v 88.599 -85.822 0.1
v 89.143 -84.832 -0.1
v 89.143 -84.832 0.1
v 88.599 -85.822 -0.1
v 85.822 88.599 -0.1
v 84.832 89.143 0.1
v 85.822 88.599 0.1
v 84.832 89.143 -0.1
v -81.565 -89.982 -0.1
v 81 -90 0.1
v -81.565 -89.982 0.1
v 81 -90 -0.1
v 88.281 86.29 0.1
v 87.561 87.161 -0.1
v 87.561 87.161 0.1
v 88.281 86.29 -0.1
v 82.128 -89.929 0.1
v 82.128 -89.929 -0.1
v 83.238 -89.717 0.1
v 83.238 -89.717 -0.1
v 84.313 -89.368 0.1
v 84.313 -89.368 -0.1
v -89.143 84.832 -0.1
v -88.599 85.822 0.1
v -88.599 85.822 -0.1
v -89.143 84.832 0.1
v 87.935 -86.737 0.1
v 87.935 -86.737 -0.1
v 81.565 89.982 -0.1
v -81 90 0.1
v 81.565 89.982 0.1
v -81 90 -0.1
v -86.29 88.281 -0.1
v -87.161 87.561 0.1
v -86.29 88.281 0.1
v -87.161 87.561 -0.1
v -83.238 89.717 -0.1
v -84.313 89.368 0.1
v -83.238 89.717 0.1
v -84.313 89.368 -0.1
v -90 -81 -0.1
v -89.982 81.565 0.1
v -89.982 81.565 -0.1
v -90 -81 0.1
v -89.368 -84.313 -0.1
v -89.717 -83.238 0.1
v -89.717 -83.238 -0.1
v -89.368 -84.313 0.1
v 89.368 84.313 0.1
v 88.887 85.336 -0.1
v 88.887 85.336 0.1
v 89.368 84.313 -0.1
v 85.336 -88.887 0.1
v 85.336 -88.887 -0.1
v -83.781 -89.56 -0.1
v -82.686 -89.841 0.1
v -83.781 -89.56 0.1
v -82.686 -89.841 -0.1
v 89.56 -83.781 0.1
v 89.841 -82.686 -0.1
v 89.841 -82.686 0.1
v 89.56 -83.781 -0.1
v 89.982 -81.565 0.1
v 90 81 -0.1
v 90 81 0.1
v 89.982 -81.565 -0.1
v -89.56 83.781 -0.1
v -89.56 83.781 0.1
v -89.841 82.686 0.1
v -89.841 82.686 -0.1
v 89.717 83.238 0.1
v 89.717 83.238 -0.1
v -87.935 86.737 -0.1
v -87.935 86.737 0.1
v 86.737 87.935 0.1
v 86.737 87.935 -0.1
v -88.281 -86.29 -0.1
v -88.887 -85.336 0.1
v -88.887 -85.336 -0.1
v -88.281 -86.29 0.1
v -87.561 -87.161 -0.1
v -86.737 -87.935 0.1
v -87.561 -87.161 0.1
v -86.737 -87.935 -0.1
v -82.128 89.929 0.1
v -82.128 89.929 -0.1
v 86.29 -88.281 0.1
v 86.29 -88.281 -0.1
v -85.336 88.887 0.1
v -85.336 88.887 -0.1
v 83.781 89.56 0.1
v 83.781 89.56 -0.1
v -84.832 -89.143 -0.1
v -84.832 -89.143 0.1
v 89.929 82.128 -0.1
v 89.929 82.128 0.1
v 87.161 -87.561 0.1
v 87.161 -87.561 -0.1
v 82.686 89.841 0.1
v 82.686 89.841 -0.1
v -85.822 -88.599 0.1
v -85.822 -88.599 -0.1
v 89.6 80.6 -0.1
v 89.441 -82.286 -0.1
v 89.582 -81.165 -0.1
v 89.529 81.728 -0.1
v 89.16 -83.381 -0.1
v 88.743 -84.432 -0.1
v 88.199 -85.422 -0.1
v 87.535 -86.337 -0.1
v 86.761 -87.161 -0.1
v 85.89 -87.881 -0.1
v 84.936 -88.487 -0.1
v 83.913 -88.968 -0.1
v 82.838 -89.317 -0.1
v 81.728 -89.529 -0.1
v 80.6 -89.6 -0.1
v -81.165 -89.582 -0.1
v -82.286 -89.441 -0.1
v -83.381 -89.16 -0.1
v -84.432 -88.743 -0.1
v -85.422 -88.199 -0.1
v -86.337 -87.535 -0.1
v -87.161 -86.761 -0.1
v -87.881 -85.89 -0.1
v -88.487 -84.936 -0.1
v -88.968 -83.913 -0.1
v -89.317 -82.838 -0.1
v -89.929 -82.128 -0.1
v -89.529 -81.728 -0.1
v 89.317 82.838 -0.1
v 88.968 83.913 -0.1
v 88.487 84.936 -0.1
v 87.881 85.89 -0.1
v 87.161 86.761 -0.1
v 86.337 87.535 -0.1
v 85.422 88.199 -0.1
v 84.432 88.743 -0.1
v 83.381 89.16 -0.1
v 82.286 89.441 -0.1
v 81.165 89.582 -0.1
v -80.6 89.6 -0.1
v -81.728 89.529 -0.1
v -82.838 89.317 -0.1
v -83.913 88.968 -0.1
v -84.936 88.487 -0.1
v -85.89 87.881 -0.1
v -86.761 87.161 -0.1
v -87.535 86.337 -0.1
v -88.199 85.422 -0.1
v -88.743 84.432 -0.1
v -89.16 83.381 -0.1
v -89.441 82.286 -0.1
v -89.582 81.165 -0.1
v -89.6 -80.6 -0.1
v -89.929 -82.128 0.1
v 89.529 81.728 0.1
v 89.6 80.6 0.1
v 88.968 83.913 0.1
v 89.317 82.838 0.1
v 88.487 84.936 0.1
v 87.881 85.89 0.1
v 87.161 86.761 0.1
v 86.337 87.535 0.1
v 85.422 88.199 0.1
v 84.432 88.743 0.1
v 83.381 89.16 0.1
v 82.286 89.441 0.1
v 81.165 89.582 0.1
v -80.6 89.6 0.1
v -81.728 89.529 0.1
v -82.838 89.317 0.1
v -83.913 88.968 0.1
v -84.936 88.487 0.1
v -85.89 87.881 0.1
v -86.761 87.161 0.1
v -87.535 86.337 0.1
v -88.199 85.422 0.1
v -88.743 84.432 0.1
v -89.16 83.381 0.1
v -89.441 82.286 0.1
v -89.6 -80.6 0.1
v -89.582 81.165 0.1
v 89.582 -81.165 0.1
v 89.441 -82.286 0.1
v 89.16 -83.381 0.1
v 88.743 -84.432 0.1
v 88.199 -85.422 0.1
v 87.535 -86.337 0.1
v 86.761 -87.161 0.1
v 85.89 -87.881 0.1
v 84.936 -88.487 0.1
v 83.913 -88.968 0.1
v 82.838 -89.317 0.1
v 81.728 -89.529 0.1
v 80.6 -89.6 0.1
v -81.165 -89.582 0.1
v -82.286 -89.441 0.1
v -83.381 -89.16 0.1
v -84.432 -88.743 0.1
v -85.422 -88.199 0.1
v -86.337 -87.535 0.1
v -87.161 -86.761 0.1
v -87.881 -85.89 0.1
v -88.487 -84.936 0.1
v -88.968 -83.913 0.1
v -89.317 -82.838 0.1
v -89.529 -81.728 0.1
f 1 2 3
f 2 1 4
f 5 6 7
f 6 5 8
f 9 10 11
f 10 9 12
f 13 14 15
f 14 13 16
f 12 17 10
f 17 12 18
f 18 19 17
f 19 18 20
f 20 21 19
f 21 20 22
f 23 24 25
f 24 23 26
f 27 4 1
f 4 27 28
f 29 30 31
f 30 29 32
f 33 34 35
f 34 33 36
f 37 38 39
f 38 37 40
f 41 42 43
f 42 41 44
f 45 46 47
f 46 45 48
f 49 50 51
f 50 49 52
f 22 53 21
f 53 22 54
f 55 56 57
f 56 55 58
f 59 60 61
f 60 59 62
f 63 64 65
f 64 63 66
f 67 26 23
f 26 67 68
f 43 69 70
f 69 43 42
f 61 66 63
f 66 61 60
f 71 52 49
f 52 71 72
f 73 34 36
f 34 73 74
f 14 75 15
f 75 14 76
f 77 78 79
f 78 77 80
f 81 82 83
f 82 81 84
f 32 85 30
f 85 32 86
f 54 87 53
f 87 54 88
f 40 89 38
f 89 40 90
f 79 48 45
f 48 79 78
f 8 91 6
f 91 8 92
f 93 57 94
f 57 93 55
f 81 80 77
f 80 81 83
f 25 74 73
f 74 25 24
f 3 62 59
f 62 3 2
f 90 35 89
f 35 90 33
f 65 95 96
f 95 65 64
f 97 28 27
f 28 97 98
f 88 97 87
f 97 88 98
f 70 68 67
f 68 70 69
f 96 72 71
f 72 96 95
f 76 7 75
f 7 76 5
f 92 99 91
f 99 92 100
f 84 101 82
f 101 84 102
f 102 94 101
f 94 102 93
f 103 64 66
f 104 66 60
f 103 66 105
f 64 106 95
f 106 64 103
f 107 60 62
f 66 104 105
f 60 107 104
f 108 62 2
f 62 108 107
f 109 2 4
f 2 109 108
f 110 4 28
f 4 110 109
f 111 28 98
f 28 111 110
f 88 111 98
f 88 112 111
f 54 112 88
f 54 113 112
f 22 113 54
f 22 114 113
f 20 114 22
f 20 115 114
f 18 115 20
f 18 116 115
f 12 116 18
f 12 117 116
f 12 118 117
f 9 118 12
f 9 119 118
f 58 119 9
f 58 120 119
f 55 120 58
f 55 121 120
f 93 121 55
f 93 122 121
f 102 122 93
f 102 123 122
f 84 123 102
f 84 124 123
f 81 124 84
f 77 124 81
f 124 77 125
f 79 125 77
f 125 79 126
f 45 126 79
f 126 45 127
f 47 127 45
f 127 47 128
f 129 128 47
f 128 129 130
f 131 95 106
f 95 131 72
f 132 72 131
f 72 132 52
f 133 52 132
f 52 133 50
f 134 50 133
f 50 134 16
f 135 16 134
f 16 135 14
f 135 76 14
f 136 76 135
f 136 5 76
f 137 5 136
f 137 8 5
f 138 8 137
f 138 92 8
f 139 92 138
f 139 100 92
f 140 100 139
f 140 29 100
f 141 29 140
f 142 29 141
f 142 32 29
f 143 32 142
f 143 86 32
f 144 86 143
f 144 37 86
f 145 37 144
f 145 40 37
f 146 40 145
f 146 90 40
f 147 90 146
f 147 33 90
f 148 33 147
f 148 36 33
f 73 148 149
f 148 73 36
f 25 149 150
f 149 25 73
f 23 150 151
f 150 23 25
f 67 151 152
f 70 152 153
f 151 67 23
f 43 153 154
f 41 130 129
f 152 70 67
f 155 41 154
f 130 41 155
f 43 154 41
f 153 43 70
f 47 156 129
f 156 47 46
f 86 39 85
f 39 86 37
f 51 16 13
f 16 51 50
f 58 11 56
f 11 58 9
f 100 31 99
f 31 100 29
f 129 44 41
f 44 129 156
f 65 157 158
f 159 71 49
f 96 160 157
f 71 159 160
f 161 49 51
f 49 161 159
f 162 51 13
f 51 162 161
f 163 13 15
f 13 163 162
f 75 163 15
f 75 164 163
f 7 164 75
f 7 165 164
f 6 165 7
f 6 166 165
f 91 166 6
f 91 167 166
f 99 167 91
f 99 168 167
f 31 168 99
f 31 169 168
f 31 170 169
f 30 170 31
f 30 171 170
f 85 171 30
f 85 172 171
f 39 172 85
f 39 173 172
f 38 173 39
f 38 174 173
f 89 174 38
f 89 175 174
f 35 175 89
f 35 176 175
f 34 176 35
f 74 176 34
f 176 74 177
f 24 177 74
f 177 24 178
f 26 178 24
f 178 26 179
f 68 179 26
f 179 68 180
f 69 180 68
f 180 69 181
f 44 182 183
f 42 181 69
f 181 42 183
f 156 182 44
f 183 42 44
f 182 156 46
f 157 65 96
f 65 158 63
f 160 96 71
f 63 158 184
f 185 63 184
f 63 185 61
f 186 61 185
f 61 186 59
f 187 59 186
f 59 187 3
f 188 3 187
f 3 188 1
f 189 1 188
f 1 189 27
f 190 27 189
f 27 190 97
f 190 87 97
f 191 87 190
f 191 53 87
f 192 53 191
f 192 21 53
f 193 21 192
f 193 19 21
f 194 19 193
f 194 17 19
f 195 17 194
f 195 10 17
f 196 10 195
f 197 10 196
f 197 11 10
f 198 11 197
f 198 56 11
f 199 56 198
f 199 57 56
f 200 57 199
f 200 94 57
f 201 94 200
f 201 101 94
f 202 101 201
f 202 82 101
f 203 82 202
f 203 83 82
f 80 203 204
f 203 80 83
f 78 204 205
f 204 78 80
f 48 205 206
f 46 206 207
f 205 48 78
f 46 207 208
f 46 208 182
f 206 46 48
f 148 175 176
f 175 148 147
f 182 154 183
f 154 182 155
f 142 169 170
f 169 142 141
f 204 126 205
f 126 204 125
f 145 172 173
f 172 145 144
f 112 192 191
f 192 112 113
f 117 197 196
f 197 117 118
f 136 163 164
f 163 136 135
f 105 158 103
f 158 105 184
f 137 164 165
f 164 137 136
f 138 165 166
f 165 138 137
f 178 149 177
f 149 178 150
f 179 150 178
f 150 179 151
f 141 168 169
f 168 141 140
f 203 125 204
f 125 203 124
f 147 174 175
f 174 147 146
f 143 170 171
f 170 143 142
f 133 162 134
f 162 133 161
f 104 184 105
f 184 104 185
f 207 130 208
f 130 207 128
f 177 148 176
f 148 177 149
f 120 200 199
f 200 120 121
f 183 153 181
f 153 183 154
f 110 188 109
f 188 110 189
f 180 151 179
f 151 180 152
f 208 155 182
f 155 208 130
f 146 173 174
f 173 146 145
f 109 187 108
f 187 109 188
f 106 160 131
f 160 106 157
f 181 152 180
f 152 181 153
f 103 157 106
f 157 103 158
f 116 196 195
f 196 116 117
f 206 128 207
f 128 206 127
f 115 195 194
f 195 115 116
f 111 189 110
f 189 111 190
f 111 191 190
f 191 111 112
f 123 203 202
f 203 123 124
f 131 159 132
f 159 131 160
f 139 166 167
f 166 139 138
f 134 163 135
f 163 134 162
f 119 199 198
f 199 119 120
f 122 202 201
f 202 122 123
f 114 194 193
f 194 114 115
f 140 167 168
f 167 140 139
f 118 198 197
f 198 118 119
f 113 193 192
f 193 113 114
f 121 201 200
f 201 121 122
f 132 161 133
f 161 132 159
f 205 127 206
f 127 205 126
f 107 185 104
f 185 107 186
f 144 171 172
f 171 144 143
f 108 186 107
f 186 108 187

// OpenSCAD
// cotes exterieur de la piece de calibration --- external dimensions of the calibration part
cote = 180 ;
// diametre de la buse --- diameter of the nozzle
buse= 0.4; 
// hauteur de la couche (rentrer la meme dans votre trancheur pour faire 1 couche) ---height of the layer (bring the same into your slicer to make a single layer)
hauteur=0.2 ;          
                       





difference (){
hull(){
for (i = [0:90:270])
    {  
  rotate([0, 0, i])
 translate ([(cote/2)-(cote/20),(cote/2)-(cote/20),0])
cylinder ( d=cote/10, h=hauteur , center = true,$fn=50 ); 
     }
       }

hull(){
for (i = [0:90:270])
   {  
  rotate([0, 0, i])
 translate ([(cote/2)-(cote/20)-buse,(cote/2)-(cote/20)-buse,0])
cylinder ( d=cote/10, h=hauteur*10, center = true,$fn=50 ); 
   }
      }
             }
